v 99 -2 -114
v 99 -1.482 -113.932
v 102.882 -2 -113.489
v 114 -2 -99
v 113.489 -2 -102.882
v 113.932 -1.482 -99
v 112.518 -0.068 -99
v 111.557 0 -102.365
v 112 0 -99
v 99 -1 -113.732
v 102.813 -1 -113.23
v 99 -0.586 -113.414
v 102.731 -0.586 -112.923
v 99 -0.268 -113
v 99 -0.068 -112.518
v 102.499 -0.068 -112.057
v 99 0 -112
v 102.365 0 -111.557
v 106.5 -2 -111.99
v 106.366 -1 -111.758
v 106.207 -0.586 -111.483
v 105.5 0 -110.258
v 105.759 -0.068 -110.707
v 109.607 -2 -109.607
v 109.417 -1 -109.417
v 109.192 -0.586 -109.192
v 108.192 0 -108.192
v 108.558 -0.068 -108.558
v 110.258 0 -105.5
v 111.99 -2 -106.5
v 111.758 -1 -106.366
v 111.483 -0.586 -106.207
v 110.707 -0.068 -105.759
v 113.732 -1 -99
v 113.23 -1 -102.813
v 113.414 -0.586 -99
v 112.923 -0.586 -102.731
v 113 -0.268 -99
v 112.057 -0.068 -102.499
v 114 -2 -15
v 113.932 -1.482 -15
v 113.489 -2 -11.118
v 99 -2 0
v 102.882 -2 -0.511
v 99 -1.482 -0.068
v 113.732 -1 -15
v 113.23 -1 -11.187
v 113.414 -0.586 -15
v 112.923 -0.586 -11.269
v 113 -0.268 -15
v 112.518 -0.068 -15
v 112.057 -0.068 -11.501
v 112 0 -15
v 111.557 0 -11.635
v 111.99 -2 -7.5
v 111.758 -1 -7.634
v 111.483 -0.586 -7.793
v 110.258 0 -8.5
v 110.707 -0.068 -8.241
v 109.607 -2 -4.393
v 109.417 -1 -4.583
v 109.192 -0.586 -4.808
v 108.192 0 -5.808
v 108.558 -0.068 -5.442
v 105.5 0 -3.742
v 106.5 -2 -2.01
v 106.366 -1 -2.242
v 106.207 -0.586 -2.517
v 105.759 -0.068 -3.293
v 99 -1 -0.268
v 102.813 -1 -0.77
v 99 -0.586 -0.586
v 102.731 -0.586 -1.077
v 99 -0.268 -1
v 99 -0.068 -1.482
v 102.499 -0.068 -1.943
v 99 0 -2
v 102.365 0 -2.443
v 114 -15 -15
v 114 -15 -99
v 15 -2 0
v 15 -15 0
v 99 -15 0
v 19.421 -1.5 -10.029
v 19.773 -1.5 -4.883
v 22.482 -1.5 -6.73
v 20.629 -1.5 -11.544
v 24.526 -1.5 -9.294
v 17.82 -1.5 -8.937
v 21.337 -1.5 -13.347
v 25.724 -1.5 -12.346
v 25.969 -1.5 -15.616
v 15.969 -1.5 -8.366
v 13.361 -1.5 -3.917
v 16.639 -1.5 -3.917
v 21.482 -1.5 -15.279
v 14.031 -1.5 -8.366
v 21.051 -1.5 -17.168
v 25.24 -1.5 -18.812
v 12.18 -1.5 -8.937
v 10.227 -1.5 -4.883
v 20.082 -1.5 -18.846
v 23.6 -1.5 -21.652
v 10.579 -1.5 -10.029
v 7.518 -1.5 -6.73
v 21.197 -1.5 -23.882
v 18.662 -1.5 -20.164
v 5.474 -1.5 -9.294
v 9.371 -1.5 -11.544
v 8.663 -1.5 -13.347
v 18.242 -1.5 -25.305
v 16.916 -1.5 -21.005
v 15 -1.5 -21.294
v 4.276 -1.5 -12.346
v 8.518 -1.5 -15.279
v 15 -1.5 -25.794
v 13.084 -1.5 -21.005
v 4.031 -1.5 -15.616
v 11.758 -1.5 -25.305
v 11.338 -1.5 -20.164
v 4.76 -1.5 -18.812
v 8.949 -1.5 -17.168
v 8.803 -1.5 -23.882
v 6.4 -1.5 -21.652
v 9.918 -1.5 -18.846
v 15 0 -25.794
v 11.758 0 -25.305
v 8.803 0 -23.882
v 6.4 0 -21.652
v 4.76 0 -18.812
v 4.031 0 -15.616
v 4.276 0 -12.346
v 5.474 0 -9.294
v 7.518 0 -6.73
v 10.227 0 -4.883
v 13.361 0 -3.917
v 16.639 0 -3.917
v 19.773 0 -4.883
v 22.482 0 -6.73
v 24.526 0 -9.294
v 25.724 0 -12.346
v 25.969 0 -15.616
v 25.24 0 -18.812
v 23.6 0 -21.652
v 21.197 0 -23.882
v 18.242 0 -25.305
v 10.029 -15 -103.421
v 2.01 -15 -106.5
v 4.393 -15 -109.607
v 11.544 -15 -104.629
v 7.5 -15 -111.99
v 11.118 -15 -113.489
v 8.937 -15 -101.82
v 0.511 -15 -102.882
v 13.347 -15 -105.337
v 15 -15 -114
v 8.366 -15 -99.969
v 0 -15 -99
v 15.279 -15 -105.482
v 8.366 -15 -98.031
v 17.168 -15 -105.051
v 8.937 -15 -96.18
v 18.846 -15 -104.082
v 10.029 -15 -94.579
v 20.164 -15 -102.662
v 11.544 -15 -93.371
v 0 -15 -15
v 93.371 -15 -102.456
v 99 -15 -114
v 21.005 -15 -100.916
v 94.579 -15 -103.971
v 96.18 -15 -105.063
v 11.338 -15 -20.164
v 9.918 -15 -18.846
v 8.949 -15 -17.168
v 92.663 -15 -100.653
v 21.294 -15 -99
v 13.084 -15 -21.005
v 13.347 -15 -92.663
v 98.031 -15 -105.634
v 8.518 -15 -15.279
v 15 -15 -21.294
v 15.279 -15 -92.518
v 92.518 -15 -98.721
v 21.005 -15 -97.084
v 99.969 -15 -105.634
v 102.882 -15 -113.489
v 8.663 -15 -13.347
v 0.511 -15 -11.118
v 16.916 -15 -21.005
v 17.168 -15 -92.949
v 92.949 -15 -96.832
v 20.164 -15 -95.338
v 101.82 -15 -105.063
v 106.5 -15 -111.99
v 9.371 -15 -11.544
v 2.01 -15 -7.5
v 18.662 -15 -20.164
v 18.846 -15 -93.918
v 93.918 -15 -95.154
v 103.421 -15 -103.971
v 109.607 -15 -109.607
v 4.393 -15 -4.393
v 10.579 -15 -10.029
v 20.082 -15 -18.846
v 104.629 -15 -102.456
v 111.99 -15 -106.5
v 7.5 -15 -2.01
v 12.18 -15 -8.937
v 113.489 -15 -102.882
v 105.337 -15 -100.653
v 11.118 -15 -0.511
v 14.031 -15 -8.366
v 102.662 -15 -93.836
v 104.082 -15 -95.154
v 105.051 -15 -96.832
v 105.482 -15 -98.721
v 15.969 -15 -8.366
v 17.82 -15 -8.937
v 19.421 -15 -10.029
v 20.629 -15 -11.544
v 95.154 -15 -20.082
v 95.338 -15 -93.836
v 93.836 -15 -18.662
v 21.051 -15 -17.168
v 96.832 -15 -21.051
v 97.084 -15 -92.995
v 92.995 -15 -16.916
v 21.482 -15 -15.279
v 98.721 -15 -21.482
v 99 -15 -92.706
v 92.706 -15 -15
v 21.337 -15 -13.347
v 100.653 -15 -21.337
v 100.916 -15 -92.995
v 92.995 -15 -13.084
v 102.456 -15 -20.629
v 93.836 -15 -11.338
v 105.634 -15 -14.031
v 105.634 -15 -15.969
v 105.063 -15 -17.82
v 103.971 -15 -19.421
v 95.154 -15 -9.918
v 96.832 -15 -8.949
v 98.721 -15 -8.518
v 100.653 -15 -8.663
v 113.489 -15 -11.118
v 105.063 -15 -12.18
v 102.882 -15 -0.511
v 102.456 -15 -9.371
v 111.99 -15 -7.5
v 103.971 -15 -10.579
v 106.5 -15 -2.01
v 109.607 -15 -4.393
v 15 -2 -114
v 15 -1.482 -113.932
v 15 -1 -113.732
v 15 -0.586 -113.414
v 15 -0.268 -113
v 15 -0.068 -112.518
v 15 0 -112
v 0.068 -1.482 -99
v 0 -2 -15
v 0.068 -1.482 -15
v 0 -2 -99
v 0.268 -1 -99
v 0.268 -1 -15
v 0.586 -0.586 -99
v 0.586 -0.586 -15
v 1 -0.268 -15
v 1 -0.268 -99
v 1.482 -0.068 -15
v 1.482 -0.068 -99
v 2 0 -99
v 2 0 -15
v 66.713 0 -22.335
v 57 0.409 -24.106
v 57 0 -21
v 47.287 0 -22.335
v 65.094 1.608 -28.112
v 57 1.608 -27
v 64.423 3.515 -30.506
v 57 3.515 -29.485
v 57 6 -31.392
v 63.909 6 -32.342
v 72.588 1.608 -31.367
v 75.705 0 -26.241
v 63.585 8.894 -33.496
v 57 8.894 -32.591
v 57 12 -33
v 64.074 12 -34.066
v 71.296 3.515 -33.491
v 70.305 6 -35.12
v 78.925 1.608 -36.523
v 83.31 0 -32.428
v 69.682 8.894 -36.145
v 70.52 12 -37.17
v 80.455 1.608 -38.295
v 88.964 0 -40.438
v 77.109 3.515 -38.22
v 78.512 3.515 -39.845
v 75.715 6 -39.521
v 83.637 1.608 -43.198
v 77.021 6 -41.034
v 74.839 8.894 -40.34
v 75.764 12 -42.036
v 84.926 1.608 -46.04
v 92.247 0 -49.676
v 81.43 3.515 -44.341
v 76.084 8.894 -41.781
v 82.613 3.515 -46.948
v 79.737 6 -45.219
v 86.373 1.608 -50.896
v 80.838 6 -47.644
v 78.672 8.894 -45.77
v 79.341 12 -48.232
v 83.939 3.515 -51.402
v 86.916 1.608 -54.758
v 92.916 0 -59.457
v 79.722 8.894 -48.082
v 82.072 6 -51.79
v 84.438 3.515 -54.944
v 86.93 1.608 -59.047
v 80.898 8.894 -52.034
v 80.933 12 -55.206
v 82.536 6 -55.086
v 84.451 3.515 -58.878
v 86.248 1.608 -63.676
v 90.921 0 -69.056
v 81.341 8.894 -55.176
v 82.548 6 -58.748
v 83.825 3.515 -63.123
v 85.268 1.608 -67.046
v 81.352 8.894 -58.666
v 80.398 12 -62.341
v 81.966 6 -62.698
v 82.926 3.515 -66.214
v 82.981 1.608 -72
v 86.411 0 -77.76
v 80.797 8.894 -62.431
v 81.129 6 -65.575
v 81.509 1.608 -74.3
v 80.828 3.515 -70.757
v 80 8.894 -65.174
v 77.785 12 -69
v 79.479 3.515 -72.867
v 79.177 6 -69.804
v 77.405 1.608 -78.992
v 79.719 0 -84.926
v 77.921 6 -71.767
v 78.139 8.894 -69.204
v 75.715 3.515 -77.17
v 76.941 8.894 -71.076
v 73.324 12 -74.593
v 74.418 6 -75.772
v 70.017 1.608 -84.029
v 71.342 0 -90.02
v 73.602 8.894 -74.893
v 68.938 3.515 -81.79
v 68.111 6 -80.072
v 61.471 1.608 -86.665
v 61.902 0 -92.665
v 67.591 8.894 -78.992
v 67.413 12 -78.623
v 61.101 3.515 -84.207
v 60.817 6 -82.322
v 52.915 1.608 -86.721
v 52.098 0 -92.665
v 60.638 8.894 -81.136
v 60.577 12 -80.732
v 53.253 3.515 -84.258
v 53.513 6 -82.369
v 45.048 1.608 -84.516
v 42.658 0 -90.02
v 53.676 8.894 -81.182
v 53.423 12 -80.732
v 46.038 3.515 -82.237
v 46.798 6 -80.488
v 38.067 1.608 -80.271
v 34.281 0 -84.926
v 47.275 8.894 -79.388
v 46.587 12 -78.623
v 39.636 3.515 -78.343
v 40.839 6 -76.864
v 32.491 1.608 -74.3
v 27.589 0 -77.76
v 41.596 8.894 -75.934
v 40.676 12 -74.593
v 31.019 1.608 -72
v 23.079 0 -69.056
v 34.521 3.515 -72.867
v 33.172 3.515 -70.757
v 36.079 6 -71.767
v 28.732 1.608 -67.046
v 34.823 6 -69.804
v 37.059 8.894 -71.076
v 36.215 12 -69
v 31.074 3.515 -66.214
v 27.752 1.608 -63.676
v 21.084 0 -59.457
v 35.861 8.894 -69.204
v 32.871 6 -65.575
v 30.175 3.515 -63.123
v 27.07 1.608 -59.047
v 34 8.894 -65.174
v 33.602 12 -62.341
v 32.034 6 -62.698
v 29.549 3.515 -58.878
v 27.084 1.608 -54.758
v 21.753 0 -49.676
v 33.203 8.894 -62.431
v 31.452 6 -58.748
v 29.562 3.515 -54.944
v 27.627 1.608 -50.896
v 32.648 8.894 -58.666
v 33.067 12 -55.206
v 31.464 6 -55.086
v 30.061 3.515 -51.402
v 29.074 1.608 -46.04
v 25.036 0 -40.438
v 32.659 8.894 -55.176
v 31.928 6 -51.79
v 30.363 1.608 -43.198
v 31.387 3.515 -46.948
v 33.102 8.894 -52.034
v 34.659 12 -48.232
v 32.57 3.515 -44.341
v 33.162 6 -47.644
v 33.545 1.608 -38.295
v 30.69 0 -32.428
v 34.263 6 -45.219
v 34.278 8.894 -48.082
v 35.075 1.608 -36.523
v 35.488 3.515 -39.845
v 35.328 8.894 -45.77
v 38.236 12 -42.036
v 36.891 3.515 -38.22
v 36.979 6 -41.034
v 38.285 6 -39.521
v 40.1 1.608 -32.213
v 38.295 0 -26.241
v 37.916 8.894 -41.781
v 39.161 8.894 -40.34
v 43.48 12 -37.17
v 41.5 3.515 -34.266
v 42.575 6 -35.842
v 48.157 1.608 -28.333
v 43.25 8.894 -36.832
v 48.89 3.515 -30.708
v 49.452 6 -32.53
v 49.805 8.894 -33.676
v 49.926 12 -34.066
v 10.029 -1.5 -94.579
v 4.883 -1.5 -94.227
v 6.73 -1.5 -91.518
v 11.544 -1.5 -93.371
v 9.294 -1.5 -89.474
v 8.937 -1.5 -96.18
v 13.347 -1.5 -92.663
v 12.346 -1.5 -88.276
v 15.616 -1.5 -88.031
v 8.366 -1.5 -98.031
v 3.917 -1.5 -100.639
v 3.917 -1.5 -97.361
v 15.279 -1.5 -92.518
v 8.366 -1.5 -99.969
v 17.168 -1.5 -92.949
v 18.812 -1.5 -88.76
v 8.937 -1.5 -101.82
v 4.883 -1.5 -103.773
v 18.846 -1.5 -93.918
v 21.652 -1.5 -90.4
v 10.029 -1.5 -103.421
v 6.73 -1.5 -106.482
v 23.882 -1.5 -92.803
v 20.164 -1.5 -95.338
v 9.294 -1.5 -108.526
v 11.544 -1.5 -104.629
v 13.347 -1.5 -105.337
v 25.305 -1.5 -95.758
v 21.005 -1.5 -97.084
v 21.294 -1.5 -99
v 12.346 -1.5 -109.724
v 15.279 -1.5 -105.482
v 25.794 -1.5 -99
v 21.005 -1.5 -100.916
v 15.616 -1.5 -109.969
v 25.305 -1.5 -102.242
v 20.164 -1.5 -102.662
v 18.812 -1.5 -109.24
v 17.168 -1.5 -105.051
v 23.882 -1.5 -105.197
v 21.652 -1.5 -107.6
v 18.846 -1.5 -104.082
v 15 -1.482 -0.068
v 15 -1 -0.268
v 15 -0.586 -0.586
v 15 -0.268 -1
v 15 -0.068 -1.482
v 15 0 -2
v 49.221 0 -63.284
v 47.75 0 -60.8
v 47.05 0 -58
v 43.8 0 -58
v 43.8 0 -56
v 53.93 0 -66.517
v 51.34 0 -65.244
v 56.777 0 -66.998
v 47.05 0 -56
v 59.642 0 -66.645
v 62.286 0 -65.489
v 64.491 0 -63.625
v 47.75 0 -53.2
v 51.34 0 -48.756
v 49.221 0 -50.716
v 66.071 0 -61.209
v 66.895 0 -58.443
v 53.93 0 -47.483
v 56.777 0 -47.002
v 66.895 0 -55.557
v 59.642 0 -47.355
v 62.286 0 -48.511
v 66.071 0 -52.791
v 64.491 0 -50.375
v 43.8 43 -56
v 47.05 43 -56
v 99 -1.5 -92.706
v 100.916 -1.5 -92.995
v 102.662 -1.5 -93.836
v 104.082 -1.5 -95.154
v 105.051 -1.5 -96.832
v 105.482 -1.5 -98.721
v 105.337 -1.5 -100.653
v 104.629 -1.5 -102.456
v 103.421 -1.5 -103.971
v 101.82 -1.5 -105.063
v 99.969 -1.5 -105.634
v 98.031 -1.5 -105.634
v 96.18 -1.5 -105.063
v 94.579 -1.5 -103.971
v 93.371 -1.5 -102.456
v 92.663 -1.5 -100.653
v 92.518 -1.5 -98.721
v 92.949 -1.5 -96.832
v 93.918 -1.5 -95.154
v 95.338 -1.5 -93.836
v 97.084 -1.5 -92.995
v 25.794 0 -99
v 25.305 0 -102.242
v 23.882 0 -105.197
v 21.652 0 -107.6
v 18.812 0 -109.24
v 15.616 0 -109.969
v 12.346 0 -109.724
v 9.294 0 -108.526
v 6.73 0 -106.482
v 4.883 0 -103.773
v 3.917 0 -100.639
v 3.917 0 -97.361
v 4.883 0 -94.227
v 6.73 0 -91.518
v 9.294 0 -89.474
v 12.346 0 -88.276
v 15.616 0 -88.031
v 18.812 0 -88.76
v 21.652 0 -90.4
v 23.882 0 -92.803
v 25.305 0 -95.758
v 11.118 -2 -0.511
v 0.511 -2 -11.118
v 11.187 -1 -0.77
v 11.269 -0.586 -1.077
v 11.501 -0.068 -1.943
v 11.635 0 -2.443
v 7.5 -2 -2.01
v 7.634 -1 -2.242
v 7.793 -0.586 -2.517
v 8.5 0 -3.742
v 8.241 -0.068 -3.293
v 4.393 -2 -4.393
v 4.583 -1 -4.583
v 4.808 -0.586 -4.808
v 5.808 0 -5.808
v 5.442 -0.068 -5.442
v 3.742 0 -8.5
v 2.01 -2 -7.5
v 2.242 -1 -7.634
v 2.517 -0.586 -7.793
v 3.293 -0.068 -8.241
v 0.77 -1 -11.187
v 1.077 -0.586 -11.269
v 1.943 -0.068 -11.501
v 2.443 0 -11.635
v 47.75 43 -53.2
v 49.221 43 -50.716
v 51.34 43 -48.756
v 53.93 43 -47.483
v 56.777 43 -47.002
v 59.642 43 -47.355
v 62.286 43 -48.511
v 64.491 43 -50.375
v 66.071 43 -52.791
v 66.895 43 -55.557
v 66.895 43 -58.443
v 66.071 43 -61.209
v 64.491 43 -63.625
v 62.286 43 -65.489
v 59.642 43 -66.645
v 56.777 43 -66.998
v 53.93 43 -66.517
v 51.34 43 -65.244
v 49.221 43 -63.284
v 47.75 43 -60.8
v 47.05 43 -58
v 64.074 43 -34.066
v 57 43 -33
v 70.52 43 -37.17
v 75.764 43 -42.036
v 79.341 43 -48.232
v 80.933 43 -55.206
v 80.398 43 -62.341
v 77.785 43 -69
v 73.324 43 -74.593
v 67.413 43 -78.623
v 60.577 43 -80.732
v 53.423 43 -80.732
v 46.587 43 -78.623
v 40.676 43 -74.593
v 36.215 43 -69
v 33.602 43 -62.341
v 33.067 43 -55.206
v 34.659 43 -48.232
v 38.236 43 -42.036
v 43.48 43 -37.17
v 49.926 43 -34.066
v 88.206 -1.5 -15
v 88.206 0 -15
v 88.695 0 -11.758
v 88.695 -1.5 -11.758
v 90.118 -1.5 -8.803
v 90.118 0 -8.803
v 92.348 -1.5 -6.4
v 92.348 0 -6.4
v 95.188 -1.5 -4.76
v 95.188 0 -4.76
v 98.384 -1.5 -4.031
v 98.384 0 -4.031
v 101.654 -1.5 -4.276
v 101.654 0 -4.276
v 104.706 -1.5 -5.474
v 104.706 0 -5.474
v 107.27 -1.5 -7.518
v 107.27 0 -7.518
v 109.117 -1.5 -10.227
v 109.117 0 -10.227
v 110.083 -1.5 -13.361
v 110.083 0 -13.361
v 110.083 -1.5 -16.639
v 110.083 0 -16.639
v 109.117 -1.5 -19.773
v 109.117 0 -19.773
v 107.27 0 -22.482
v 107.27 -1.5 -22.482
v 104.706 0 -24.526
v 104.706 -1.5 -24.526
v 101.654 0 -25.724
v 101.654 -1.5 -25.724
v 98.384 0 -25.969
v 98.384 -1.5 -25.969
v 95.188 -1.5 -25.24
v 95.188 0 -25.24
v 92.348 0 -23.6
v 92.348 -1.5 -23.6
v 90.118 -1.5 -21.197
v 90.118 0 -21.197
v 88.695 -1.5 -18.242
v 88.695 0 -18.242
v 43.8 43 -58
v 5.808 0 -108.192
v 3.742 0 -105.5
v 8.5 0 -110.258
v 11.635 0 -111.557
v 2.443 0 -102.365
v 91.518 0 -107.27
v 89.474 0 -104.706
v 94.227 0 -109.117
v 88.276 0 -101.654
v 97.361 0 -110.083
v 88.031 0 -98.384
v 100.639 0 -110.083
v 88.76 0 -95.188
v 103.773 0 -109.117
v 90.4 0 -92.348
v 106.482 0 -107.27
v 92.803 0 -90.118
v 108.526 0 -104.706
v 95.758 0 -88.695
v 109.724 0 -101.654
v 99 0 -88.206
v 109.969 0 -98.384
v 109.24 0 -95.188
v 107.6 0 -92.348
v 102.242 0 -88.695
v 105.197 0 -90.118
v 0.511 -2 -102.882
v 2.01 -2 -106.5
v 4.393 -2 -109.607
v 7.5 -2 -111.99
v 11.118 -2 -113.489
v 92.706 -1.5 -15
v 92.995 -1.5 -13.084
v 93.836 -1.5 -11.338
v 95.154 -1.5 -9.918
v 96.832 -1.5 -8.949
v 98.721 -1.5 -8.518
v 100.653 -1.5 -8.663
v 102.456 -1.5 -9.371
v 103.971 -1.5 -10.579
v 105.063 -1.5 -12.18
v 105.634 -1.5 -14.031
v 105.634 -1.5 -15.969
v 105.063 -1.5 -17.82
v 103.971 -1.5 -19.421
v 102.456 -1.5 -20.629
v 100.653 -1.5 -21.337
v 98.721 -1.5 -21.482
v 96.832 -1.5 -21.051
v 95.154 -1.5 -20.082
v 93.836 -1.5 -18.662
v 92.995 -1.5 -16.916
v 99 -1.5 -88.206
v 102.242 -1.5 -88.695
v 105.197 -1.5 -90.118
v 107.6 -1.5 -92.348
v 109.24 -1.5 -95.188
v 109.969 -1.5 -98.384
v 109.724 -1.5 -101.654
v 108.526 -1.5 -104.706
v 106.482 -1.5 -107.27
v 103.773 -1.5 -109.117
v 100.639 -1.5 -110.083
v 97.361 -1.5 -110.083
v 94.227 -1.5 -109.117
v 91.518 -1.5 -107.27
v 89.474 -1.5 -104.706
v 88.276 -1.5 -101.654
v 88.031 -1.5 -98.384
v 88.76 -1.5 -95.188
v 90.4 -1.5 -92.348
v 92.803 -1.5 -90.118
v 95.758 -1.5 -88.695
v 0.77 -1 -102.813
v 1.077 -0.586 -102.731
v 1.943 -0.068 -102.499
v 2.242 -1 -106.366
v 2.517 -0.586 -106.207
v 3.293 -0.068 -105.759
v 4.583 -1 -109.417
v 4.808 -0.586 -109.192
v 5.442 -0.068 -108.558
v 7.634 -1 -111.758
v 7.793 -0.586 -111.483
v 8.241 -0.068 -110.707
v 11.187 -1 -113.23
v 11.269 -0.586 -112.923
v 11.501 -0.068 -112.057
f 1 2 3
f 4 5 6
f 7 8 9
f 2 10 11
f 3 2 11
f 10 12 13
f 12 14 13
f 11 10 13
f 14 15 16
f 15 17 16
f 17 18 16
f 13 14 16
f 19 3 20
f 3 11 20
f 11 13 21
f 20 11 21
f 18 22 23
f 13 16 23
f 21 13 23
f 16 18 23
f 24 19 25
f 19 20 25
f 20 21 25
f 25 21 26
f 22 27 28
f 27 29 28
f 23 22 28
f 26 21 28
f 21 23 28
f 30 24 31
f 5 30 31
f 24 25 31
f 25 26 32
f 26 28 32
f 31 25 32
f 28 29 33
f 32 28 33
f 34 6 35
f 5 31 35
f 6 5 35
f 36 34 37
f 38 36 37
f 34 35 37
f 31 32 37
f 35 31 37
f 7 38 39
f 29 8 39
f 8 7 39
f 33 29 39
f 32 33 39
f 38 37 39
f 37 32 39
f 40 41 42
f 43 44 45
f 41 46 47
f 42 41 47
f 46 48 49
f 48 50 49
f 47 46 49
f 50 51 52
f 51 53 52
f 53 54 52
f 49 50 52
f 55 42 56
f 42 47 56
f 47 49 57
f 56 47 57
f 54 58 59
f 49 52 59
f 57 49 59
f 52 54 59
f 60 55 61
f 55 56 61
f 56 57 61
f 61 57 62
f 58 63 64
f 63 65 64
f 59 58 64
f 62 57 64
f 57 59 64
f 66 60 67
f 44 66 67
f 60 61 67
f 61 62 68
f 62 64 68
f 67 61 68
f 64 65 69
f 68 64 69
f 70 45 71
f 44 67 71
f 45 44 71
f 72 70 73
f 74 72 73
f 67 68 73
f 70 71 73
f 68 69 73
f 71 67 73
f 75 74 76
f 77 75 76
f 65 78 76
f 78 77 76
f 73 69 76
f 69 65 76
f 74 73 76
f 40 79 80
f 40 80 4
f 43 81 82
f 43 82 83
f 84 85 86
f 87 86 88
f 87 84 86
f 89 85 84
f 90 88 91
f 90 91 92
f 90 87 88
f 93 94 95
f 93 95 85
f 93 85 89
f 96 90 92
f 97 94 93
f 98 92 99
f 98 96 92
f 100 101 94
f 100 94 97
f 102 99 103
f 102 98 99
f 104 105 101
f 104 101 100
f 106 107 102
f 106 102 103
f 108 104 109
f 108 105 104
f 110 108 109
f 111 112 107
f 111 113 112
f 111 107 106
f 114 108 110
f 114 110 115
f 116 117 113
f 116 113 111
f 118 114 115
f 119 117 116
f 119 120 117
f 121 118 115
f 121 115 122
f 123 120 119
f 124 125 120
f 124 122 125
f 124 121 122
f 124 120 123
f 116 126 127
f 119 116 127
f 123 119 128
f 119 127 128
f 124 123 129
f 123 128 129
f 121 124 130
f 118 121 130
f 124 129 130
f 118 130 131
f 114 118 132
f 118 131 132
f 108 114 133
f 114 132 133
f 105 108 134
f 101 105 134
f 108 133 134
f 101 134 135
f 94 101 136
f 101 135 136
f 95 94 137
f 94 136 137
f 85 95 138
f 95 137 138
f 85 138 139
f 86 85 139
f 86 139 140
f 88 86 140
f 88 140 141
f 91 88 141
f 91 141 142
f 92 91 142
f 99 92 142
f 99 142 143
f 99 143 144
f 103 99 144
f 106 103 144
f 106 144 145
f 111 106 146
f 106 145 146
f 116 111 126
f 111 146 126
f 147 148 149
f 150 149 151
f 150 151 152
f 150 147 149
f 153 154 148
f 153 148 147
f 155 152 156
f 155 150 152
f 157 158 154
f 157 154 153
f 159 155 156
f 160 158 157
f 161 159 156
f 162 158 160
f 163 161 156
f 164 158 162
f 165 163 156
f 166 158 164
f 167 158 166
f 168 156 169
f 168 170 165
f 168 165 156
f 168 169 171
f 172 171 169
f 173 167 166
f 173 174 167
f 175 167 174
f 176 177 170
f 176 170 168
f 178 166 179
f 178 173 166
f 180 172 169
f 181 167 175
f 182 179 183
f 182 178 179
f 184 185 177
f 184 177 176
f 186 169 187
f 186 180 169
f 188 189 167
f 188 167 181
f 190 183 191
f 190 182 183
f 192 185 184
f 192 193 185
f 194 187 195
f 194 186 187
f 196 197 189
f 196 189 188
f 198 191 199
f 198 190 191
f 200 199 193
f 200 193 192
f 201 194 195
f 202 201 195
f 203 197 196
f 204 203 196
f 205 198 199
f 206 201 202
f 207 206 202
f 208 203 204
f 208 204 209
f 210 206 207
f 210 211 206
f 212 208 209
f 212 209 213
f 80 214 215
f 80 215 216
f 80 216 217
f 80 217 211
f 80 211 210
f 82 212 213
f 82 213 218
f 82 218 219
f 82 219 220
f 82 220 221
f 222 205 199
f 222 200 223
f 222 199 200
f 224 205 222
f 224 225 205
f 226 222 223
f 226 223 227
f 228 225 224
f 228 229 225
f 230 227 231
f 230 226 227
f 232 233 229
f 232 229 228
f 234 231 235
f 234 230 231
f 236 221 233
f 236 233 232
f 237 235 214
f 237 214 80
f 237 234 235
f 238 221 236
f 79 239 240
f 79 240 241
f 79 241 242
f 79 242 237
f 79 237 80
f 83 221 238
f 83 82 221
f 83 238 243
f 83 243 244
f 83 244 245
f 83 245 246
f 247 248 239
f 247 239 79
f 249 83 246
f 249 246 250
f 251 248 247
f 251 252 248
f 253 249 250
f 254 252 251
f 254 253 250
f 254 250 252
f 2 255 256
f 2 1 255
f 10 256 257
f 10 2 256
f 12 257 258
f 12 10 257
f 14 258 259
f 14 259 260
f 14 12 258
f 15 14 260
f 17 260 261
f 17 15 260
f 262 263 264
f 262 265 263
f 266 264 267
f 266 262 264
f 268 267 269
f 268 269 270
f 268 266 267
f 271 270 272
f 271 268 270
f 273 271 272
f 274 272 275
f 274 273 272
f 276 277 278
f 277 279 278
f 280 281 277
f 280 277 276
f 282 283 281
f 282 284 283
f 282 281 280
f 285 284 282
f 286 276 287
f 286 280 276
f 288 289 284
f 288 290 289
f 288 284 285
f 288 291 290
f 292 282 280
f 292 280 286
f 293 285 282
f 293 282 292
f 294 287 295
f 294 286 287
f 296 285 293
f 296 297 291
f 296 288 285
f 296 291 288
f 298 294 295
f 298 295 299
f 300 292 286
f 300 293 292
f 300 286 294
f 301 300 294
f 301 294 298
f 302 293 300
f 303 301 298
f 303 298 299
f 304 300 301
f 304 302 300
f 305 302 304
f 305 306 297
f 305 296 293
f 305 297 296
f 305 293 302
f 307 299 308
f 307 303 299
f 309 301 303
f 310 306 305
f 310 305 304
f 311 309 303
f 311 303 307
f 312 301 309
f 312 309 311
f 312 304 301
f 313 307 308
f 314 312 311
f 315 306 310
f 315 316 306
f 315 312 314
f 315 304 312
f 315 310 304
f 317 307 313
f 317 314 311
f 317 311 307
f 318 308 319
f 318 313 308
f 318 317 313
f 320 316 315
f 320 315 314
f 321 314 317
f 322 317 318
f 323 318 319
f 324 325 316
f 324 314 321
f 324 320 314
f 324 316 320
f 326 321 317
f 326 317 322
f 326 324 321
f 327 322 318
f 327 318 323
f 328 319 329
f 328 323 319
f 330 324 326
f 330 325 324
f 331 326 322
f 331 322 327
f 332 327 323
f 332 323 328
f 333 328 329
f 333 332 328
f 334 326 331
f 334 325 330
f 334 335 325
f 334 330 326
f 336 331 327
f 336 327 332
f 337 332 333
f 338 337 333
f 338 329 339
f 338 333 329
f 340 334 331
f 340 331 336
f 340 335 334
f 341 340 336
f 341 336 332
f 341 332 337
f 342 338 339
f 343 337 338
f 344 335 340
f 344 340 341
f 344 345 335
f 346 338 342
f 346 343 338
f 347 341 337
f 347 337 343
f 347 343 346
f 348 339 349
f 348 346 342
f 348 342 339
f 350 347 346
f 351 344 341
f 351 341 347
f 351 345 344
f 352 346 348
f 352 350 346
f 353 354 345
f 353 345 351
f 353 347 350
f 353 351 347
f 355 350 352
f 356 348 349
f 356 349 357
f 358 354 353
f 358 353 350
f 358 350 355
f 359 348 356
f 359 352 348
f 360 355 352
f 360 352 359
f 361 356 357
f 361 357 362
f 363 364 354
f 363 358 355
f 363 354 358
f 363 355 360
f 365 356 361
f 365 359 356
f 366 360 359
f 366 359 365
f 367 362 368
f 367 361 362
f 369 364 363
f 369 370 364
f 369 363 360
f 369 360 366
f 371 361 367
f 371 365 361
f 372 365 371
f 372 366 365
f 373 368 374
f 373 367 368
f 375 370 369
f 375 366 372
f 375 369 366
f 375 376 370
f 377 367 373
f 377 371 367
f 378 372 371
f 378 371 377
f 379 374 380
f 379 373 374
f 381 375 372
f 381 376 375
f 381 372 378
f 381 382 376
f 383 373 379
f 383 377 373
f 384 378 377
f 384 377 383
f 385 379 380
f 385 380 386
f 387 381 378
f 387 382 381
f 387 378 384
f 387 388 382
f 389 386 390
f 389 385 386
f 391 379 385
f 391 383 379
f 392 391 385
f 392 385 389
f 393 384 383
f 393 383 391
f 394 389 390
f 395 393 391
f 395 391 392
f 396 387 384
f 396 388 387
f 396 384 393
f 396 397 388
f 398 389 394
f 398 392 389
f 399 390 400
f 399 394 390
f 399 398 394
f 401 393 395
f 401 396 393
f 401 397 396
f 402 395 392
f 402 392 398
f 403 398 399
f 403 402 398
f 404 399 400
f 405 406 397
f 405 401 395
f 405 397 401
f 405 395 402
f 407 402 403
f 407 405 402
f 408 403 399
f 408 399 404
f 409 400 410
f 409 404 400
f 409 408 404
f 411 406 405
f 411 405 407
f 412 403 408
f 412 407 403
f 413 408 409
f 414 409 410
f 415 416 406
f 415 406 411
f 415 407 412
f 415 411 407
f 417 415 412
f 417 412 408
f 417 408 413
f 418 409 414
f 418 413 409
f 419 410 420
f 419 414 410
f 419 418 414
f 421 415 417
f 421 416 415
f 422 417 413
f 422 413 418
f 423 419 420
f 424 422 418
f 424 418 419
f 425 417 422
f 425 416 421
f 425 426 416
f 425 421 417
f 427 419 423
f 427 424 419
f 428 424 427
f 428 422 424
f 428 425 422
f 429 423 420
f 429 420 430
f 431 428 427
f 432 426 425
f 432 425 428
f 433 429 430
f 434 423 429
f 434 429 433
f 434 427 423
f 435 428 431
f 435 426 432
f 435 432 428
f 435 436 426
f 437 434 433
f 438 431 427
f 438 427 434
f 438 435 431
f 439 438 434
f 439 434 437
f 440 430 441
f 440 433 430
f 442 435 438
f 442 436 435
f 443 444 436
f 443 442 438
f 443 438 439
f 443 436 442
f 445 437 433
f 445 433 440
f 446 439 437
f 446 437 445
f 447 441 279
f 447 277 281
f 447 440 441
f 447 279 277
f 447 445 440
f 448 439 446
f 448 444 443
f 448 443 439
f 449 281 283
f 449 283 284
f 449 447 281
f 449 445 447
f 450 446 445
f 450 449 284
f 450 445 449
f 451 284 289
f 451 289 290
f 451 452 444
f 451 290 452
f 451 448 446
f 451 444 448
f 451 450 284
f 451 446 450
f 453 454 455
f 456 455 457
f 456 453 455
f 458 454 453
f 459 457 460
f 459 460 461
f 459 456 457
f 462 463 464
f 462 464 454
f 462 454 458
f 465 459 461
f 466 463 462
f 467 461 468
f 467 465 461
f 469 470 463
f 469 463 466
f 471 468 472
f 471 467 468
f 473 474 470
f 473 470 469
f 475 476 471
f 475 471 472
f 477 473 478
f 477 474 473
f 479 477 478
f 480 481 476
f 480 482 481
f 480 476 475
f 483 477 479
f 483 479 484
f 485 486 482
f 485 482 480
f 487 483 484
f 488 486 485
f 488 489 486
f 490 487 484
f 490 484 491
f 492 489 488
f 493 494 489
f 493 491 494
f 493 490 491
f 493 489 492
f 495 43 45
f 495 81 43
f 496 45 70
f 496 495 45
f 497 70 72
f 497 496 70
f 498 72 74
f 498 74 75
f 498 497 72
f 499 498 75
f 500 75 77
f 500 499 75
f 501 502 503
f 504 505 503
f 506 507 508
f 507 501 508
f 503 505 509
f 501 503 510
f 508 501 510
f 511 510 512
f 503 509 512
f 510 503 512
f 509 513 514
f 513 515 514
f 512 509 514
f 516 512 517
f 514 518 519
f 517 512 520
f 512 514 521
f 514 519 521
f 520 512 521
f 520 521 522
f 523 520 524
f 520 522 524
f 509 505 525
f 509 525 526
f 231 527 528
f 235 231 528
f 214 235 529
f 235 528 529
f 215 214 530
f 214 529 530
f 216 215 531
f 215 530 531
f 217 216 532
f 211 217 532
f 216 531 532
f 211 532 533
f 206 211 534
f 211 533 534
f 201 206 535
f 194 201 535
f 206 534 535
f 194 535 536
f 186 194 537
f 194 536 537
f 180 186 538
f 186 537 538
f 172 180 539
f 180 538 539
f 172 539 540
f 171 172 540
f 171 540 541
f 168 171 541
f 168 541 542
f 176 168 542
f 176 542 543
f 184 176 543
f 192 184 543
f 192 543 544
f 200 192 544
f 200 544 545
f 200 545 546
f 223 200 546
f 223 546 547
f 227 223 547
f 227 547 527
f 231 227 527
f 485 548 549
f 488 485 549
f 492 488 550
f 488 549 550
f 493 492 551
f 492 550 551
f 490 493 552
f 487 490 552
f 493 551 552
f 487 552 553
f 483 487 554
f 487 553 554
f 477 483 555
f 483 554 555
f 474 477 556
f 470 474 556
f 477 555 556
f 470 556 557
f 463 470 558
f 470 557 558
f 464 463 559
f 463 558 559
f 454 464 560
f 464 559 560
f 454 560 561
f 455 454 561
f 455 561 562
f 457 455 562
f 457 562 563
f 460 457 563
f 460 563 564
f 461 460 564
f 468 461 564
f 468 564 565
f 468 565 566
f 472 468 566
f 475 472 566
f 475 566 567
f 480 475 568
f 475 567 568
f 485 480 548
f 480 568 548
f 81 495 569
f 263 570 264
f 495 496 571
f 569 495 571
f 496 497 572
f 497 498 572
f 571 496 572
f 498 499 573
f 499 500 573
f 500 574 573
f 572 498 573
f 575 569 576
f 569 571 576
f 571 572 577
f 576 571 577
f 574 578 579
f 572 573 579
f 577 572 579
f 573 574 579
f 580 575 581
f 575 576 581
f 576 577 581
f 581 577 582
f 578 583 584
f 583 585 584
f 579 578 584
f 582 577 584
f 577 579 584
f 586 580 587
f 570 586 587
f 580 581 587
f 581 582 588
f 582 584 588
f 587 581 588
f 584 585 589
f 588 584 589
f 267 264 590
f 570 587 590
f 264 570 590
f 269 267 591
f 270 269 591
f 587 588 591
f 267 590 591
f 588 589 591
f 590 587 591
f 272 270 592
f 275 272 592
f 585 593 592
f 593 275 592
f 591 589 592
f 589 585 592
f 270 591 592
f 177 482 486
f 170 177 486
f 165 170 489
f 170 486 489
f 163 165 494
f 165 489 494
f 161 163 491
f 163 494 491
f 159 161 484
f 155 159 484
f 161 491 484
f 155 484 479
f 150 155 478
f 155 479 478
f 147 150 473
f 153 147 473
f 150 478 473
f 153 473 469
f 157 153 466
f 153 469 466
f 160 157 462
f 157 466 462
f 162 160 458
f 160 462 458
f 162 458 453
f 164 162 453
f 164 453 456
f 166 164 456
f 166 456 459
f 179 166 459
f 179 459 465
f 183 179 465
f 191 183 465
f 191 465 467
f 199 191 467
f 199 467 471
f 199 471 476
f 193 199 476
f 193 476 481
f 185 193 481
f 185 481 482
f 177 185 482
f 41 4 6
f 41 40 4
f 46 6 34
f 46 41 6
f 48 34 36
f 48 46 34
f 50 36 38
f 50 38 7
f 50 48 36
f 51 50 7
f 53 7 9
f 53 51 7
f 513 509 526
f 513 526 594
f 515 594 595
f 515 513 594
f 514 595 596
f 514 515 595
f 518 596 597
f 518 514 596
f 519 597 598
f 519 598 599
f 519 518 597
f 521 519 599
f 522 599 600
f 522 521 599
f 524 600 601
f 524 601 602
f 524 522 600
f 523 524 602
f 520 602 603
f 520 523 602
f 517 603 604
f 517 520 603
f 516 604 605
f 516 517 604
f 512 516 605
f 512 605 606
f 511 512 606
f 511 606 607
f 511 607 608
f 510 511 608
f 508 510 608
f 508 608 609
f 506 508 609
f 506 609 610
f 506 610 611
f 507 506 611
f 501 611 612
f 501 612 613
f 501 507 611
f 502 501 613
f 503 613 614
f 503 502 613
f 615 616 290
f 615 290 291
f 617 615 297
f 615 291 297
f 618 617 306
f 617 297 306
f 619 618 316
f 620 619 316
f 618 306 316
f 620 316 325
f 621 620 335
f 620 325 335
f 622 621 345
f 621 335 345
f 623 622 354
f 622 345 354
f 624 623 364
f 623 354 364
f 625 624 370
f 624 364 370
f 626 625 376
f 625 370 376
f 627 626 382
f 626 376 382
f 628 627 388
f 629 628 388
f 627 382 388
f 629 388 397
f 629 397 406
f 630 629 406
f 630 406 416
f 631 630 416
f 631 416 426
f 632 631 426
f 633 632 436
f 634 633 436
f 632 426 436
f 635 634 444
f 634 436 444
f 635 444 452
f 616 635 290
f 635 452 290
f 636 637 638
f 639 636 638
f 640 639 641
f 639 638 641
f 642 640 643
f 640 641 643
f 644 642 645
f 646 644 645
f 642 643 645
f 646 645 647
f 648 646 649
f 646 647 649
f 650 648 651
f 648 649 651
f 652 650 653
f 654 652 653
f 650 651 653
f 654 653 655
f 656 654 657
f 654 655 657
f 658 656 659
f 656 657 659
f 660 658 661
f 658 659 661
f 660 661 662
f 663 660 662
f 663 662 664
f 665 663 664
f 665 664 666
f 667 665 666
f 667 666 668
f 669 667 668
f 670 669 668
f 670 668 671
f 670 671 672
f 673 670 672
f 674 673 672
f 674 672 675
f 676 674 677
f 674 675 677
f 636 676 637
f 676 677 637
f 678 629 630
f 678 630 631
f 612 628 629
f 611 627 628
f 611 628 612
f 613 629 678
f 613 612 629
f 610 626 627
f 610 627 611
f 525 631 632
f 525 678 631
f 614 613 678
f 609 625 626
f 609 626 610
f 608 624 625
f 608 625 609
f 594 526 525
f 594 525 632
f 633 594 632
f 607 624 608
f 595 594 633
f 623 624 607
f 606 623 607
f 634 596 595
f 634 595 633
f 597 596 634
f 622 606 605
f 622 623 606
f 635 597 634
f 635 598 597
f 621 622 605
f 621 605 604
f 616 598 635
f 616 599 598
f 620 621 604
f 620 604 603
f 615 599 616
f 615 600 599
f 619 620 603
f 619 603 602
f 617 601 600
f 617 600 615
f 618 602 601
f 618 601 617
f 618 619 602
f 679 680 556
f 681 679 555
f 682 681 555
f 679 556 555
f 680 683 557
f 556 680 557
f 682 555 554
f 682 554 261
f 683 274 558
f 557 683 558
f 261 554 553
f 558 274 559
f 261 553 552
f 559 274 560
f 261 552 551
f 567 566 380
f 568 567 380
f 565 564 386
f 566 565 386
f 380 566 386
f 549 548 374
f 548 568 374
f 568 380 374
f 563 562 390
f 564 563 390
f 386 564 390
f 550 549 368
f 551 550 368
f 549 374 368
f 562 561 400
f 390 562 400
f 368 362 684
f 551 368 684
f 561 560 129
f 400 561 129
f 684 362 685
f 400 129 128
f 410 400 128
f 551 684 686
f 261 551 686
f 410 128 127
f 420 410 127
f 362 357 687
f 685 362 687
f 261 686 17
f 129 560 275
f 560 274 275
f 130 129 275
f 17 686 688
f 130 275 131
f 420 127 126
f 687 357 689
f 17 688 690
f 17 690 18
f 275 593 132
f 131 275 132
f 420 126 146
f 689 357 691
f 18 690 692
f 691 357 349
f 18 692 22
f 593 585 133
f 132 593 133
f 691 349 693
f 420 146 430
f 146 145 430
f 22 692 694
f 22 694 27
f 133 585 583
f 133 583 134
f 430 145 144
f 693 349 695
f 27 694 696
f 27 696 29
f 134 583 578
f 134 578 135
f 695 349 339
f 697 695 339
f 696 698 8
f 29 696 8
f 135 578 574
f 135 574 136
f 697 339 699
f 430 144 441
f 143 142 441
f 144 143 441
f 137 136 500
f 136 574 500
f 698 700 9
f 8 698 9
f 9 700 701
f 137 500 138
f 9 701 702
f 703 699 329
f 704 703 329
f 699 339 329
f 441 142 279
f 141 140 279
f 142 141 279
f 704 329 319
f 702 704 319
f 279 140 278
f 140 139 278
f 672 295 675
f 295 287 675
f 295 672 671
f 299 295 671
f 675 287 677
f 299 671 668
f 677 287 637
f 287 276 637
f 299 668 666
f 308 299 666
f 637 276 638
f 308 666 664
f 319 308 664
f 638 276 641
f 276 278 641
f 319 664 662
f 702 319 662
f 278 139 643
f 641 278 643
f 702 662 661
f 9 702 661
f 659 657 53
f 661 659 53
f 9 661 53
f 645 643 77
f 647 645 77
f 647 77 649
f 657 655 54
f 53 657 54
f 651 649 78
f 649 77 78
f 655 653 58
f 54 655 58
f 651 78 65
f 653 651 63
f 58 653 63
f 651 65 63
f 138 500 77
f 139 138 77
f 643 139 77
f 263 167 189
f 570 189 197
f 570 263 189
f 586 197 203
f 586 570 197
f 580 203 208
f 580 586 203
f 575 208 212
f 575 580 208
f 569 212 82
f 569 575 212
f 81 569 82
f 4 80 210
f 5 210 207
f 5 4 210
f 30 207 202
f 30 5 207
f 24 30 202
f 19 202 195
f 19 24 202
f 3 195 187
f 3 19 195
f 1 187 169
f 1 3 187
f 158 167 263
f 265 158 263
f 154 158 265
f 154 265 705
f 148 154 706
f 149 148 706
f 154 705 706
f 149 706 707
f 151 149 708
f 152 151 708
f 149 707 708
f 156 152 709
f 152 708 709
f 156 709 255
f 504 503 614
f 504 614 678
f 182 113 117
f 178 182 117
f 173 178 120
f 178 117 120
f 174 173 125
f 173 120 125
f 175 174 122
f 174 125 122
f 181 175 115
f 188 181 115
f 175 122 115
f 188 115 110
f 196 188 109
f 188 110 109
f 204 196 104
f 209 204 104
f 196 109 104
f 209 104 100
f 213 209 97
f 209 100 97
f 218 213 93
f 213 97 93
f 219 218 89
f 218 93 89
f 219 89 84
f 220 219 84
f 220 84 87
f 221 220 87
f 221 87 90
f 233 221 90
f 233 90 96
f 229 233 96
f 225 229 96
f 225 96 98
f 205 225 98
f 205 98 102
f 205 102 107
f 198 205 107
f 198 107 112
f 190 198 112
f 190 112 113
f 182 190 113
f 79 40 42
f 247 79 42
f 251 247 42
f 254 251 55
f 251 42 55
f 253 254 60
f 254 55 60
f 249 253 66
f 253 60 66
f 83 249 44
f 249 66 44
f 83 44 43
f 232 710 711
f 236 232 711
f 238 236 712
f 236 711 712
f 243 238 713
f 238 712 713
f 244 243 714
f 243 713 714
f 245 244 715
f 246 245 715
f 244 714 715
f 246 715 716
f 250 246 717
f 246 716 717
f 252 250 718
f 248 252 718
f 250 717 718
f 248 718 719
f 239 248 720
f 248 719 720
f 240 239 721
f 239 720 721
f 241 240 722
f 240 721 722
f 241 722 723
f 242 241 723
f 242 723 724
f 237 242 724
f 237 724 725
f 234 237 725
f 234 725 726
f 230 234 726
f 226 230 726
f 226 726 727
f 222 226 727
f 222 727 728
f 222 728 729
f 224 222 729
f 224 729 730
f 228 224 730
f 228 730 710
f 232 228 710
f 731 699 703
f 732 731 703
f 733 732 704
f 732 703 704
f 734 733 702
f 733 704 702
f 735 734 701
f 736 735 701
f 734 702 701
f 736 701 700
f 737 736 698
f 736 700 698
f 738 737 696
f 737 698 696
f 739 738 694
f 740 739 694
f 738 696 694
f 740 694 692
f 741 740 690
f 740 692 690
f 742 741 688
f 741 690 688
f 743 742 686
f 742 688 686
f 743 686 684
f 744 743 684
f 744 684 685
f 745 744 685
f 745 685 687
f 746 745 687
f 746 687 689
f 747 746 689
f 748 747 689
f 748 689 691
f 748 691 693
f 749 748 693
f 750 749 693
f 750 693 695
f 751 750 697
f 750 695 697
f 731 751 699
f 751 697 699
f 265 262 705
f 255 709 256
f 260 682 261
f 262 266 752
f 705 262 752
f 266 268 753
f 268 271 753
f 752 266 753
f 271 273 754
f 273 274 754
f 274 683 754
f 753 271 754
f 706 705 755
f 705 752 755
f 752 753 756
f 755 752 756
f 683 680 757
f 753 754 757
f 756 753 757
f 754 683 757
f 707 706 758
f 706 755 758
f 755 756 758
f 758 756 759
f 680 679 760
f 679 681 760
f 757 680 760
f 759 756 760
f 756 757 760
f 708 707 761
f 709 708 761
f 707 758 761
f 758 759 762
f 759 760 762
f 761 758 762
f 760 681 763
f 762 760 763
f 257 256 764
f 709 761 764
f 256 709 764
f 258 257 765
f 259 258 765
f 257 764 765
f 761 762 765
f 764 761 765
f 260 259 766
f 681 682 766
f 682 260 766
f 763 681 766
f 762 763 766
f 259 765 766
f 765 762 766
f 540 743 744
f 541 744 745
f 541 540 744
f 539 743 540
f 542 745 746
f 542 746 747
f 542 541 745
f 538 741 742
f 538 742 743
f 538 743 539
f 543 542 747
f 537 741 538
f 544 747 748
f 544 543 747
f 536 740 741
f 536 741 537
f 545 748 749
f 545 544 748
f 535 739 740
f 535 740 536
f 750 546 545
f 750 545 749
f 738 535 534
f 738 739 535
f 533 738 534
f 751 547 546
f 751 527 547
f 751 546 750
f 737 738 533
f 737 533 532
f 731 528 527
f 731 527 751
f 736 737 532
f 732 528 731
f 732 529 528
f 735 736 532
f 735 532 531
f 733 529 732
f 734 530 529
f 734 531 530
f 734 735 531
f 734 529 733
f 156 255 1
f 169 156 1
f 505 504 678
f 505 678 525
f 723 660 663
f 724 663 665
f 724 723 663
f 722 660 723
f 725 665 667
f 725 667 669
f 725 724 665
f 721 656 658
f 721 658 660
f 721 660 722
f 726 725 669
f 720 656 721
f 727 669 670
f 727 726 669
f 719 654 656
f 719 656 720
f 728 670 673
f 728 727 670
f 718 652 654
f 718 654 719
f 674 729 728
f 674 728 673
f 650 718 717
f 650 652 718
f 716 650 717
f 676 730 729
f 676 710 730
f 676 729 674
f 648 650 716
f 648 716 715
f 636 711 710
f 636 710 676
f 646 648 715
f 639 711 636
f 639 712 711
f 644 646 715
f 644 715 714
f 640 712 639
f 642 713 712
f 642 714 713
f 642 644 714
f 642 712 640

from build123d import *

# Parameters (mm, degrees)
SKETCH_1_W               = 114
SKETCH_1_H               = 15
EXTRUDE_1_DEPTH          = 114
FILLET_3_R               = 15
FILLET_4_R               = 2
SKETCH_2_R               = 24
EXTRUDE_2_DEPTH          = 43
FILLET_5_R               = 12
SKETCH_3_R               = 6.5
CUT_EXTRUDE_4_DEPTH      = 167.856225604
SKETCH_3_4_R             = 11
SKETCH_3_4_R_2           = 6.5
CUT_EXTRUDE_5_DEPTH      = 1.5
PATTERN_CIRCULAR_1_COUNT = 4


with BuildPart() as part:
    # 草圖1 → 填料-伸長1 (new body)
    with BuildSketch(Plane.XY):
        with Locations((57, -7.5)):
            Rectangle(SKETCH_1_W, SKETCH_1_H)
    extrude(amount=-EXTRUDE_1_DEPTH)

    # 圓角3
    fillet_3_edges = [part.edges().sort_by_distance(p)[0] for p in [
        (0, -7.5, -114),
        (0, -7.5, 0),
        (114, -7.5, -114),
        (114, -7.5, 0),
    ]]
    fillet(fillet_3_edges, radius=FILLET_3_R)

    # 圓角4
    fillet_4_edges = [part.edges().sort_by_distance(p)[0] for p in [
        (109.606601718, 0, -4.393398282),
        (114, 0, -57),
        (109.606601718, 0, -109.606601718),
        (57, 0, -114),
        (4.393398282, 0, -109.606601718),
        (0, 0, -57),
        (4.393398282, 0, -4.393398282),
        (57, 0, 0),
    ]]
    fillet(fillet_4_edges, radius=FILLET_4_R)

    # 草圖2 → 填料-伸長2 (add)
    with BuildSketch(Plane(origin=(0, 0, 0), x_dir=(1, 0, 0), z_dir=(0, 1, 0))):
        with Locations((57, 57)):
            Circle(SKETCH_2_R)
        with BuildLine():
            Line((43.8, 58), (47.050125629, 58))
            ThreePointArc((47.050125629, 58), (67, 57), (47.050125629, 56))
            Line((47.050125629, 56), (43.8, 56))
            Line((43.8, 56), (43.8, 58))
        make_face(mode=Mode.SUBTRACT)
    extrude(amount=EXTRUDE_2_DEPTH)

    # 圓角5
    fillet_5_edges = [part.edges().sort_by_distance(p)[0] for p in [
        (33, 0, -57),
    ]]
    fillet(fillet_5_edges, radius=FILLET_5_R)

    # 草圖3 → 除料-伸長4 (cut, through all)
    with BuildSketch(Plane(origin=(0, 0, 0), x_dir=(1, 0, 0), z_dir=(0, 1, 0))):
        with Locations((99, 99.206255551)):
            Circle(SKETCH_3_R)
    cut_extrude_4 = extrude(amount=-CUT_EXTRUDE_4_DEPTH, mode=Mode.SUBTRACT)

    # 草圖3<4> → 除料-伸長5 (cut)
    with BuildSketch(Plane(origin=(0, 0, 0), x_dir=(1, 0, 0), z_dir=(0, 1, 0))):
        with Locations((99, 99.206255551)):
            Circle(SKETCH_3_4_R)
        with Locations((99, 99.206255551)):
            Circle(SKETCH_3_4_R_2, mode=Mode.SUBTRACT)
    cut_extrude_5 = extrude(amount=-CUT_EXTRUDE_5_DEPTH, mode=Mode.SUBTRACT)

    # 環狀複製排列1: 除料-伸長4, 除料-伸長5 ×4 about axis
    pattern_circular_1_axis = Axis((57, 43, -57), (0, -1, 0))
    add([cut_extrude_4.rotate(pattern_circular_1_axis, i * 360 / PATTERN_CIRCULAR_1_COUNT) for i in range(1, PATTERN_CIRCULAR_1_COUNT)], mode=Mode.SUBTRACT)
    add([cut_extrude_5.rotate(pattern_circular_1_axis, i * 360 / PATTERN_CIRCULAR_1_COUNT) for i in range(1, PATTERN_CIRCULAR_1_COUNT)], mode=Mode.SUBTRACT)


solid = part.part
